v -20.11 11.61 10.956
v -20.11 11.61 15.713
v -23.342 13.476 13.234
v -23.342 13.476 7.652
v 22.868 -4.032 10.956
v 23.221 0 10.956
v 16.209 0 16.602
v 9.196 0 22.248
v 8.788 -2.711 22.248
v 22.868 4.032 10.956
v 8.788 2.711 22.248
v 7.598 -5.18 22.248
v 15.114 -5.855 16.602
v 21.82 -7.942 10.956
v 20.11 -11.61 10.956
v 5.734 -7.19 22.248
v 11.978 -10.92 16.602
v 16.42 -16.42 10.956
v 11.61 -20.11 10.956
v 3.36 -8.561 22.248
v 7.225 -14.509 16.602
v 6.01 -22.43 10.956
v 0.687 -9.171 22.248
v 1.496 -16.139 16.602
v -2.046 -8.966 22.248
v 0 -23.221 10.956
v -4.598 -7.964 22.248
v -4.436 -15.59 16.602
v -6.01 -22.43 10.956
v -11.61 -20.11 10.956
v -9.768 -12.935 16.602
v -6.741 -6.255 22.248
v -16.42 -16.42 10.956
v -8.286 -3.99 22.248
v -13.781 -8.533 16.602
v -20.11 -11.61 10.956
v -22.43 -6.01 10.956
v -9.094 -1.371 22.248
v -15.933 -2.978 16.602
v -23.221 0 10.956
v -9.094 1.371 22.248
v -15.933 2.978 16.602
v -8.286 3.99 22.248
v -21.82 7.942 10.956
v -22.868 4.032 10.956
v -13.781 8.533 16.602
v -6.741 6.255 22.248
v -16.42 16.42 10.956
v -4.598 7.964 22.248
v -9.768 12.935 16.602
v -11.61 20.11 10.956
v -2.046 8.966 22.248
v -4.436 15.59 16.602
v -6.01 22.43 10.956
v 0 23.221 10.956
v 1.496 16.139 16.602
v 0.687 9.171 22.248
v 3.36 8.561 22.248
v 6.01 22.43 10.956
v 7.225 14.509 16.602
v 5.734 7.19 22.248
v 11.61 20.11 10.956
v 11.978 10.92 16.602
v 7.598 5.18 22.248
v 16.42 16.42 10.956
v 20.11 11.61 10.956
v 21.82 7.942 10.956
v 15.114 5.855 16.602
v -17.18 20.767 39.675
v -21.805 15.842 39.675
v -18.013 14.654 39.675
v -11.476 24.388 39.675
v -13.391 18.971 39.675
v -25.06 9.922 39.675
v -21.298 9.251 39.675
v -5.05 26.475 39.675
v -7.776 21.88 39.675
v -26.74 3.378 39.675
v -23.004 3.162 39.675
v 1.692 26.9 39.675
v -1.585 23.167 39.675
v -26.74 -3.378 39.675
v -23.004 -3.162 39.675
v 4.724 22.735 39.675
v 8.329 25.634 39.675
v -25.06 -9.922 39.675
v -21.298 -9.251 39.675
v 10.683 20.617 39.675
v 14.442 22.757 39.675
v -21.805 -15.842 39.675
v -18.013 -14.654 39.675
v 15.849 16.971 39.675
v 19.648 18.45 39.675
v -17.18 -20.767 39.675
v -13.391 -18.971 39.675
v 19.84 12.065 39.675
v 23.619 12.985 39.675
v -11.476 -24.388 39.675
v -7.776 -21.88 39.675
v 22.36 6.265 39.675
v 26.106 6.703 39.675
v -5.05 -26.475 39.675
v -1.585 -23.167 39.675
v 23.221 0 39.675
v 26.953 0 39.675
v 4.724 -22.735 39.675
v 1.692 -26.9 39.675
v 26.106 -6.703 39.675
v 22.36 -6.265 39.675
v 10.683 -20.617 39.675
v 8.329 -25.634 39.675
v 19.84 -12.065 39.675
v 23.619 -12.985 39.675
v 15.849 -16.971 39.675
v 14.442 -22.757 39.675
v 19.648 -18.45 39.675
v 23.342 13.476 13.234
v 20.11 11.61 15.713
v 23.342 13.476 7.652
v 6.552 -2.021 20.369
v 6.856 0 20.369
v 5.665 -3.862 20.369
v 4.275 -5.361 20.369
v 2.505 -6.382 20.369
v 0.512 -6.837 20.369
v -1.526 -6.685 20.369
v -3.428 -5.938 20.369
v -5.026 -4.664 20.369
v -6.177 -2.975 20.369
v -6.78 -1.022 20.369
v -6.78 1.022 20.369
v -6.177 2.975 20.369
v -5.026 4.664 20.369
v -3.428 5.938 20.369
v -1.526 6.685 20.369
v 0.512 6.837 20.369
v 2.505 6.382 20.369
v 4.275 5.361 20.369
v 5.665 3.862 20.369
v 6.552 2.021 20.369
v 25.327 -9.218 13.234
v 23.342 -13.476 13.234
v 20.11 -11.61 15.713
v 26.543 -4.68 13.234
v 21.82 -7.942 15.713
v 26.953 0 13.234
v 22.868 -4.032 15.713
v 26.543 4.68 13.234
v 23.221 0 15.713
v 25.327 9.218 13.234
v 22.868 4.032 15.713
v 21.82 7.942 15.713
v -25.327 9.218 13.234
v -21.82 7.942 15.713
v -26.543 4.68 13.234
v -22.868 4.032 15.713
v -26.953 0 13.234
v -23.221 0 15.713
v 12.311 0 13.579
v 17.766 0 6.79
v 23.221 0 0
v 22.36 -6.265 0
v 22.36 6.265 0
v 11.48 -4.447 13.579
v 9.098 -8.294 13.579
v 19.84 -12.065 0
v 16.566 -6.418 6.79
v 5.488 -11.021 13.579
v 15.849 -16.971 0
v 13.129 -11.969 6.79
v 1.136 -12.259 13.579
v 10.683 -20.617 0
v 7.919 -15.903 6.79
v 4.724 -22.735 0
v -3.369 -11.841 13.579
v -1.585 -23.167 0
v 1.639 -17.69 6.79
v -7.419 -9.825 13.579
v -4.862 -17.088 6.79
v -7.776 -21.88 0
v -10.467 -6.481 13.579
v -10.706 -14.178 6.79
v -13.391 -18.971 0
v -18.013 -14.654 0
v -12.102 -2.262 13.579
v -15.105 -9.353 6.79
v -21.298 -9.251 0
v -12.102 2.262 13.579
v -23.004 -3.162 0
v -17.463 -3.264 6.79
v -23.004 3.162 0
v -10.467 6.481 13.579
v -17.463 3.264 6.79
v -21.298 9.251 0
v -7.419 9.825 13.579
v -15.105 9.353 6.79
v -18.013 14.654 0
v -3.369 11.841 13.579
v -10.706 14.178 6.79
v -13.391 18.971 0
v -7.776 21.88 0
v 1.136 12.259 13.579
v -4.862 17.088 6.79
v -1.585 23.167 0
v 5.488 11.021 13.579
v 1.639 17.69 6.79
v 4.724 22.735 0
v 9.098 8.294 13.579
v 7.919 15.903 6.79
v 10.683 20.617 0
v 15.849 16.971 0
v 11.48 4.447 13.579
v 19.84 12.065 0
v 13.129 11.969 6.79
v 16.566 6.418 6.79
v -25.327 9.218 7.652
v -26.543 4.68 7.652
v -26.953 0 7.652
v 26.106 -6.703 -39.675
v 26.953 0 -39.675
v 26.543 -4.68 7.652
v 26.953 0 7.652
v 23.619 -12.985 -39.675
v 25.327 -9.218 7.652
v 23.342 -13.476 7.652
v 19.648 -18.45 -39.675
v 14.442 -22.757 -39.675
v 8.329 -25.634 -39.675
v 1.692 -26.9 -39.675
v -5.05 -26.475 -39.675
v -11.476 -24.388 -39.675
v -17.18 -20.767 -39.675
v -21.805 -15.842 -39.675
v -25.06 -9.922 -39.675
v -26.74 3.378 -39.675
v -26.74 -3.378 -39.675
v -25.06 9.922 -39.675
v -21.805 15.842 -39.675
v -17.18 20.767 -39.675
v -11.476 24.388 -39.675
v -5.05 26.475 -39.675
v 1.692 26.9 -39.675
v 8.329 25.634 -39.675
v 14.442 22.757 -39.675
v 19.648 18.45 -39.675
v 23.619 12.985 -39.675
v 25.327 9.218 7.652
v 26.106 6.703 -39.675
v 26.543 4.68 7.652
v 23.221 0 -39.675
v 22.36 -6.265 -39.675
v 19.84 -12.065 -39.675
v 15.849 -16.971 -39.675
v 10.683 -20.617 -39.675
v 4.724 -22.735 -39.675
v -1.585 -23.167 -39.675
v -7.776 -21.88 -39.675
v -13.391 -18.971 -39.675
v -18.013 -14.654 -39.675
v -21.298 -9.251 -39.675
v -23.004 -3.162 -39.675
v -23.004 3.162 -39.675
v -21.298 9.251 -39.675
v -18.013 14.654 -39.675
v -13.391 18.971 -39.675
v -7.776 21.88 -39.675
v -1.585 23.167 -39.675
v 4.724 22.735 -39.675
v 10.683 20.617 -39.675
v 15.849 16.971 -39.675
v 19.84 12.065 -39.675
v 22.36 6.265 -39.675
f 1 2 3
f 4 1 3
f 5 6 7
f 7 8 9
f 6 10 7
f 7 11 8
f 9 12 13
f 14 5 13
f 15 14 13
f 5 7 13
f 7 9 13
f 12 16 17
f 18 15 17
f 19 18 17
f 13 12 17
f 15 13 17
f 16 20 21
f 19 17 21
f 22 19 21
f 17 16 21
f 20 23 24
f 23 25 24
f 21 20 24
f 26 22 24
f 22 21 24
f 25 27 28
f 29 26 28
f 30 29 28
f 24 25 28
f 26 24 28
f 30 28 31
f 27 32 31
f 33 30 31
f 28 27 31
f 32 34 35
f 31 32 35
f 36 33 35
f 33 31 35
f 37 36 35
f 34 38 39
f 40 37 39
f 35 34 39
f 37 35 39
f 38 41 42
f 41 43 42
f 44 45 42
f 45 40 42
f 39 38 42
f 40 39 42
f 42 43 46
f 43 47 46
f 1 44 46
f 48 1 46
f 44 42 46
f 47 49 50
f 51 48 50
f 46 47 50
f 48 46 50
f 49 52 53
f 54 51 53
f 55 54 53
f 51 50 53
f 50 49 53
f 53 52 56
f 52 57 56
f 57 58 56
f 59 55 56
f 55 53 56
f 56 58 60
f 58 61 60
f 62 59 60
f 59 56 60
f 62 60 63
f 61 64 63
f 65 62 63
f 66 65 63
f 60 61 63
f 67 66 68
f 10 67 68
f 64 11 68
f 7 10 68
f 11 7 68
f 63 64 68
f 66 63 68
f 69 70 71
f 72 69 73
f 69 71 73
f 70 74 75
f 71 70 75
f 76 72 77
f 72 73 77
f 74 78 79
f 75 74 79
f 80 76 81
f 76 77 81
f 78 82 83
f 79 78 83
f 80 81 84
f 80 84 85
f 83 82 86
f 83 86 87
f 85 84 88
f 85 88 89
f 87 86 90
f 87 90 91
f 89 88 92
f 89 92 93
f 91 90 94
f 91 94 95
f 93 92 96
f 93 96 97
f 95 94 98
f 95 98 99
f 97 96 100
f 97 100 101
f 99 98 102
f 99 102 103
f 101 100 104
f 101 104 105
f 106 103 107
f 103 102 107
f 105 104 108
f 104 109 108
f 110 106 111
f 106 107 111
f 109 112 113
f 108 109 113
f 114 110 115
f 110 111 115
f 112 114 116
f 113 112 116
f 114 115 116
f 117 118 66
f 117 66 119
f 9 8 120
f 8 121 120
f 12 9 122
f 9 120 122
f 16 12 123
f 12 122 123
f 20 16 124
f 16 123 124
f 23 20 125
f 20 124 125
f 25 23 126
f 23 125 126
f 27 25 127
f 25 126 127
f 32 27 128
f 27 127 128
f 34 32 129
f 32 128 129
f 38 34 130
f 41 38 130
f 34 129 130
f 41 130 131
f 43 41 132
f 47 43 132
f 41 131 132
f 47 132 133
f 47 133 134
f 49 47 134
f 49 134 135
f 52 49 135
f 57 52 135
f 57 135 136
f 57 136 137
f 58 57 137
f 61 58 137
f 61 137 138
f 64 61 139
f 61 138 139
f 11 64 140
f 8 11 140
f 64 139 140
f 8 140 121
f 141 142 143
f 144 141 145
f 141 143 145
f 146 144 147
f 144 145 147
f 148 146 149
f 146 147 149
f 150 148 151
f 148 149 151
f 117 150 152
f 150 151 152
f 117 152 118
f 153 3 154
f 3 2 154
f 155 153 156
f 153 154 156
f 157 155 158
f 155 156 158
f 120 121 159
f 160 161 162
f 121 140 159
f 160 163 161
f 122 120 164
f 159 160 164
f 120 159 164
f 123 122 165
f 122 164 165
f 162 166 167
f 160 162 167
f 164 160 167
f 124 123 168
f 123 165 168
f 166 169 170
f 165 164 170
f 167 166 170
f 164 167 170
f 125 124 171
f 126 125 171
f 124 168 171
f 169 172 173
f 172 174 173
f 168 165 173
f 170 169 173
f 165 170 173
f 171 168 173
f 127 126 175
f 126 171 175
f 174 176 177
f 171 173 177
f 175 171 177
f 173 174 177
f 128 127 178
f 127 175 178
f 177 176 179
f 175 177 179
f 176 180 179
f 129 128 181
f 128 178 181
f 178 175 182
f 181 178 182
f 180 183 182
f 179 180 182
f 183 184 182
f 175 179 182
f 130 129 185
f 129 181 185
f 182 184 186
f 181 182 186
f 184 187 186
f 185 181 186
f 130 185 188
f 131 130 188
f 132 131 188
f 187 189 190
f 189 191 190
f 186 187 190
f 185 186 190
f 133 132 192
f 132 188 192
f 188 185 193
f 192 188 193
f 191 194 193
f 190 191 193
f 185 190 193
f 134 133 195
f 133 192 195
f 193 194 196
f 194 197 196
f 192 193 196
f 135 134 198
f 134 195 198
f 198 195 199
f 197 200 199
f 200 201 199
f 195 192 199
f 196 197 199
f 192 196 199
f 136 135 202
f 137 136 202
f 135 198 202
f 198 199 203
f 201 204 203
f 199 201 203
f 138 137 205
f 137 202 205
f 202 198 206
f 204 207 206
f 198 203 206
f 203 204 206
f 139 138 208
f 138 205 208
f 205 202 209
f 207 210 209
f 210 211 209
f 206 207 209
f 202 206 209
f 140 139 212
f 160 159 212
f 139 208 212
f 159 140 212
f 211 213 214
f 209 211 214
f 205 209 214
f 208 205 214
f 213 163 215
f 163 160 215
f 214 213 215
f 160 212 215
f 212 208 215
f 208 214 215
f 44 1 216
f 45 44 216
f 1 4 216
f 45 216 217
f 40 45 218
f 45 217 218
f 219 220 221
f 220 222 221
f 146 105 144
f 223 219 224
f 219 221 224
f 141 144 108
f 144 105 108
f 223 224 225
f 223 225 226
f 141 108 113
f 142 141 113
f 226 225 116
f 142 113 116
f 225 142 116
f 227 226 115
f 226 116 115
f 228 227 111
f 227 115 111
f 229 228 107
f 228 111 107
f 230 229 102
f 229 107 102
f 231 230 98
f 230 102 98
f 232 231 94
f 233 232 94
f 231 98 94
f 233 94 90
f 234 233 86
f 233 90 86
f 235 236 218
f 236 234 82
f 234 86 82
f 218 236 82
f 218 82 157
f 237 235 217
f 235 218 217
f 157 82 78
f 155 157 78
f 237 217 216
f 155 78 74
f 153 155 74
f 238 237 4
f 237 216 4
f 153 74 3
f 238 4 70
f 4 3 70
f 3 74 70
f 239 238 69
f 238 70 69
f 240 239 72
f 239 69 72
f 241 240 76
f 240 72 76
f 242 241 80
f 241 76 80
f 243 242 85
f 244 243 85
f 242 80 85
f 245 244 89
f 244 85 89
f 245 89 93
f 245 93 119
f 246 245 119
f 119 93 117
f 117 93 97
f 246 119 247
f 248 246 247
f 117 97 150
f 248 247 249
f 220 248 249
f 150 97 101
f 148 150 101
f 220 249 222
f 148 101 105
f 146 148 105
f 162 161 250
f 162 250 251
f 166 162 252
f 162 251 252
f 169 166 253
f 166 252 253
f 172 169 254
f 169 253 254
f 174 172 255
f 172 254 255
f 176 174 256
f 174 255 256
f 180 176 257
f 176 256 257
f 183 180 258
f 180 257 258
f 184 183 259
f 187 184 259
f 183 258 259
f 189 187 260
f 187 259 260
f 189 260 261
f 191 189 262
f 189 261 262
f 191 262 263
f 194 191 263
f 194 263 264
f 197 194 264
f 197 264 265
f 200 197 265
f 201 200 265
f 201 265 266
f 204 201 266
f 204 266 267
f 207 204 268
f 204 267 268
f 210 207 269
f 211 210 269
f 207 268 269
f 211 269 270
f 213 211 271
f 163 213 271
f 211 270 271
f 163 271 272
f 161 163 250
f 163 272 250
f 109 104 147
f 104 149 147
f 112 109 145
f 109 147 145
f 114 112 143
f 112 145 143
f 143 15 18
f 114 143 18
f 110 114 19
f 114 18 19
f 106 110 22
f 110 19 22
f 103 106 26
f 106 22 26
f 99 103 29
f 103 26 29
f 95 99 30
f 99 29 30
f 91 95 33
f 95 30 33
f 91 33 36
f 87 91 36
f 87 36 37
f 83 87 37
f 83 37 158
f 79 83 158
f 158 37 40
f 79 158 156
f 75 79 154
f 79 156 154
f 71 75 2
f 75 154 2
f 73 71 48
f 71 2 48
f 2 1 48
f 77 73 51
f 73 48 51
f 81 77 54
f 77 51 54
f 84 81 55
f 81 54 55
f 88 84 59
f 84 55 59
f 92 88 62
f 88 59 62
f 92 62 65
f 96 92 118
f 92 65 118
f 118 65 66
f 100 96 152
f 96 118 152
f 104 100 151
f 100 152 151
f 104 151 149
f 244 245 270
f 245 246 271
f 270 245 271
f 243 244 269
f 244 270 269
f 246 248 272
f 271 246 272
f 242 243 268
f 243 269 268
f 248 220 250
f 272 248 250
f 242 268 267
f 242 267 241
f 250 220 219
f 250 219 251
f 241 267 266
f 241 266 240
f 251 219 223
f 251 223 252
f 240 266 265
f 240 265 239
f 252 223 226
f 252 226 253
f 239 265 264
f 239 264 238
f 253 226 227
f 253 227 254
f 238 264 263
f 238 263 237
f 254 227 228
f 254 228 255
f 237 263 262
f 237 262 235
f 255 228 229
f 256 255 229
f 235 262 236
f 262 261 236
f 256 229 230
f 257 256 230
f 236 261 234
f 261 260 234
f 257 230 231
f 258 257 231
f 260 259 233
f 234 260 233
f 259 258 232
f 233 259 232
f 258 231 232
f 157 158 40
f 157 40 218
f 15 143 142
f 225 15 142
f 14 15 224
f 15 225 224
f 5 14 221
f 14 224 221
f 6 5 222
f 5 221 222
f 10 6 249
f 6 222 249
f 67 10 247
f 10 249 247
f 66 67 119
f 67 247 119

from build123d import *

# Parameters (mm, degrees)
F2_ANGLE_BACK  = 30
F2_ANGLE       = 60
F3_ANGLE_START = 150
F3_ANGLE       = 30


with BuildPart() as f1:
    # F0 (on Front) → F1 (revolve)
    with BuildSketch(Plane.XZ):
        Polygon((26.9527230412, 13.23380135), (26.9527230412, 39.6751612425), (23.2207458466, 39.6751612425), (23.2207458466, 15.7125871629), align=None)
        Polygon((26.9527230412, 7.6516205445), (26.9527230412, 13.23380135), (23.2207458466, 15.7125871629), (23.2207458466, 10.9555618837), align=None)
        Polygon((26.9527230412, -39.6751612425), (26.9527230412, 7.6516205445), (23.2207458466, 10.9555618837), (9.1962680429, 22.2483958323), (6.8564140238, 20.368527621), (23.2207458466, 0), (23.2207458466, -39.6751612425), align=None)
    revolve(axis=Axis((0, 0, 5.4553020746), (0, 0, -1)))

    # F0 (on Front) → F2 (revolve, cut)
    with BuildSketch(Plane.XZ, mode=Mode.PRIVATE) as f2_sk:
        Polygon((26.9527230412, 7.6516205445), (26.9527230412, 13.23380135), (23.2207458466, 15.7125871629), (23.2207458466, 10.9555618837), align=None)
    revolve(f2_sk.sketch.rotate(Axis((0, 0, 5.4553020746), (0, 0, 1)), -F2_ANGLE_BACK), axis=Axis((0, 0, 5.4553020746), (0, 0, 1)), revolution_arc=F2_ANGLE, mode=Mode.SUBTRACT)

    # F0 (on Front) → F3 (revolve, cut)
    with BuildSketch(Plane.XZ, mode=Mode.PRIVATE) as f3_sk:
        Polygon((26.9527230412, 7.6516205445), (26.9527230412, 13.23380135), (23.2207458466, 15.7125871629), (23.2207458466, 10.9555618837), align=None)
    revolve(f3_sk.sketch.rotate(Axis((0, 0, 5.4553020746), (0, 0, 1)), F3_ANGLE_START), axis=Axis((0, 0, 5.4553020746), (0, 0, 1)), revolution_arc=F3_ANGLE, mode=Mode.SUBTRACT)


solid = f1.part
